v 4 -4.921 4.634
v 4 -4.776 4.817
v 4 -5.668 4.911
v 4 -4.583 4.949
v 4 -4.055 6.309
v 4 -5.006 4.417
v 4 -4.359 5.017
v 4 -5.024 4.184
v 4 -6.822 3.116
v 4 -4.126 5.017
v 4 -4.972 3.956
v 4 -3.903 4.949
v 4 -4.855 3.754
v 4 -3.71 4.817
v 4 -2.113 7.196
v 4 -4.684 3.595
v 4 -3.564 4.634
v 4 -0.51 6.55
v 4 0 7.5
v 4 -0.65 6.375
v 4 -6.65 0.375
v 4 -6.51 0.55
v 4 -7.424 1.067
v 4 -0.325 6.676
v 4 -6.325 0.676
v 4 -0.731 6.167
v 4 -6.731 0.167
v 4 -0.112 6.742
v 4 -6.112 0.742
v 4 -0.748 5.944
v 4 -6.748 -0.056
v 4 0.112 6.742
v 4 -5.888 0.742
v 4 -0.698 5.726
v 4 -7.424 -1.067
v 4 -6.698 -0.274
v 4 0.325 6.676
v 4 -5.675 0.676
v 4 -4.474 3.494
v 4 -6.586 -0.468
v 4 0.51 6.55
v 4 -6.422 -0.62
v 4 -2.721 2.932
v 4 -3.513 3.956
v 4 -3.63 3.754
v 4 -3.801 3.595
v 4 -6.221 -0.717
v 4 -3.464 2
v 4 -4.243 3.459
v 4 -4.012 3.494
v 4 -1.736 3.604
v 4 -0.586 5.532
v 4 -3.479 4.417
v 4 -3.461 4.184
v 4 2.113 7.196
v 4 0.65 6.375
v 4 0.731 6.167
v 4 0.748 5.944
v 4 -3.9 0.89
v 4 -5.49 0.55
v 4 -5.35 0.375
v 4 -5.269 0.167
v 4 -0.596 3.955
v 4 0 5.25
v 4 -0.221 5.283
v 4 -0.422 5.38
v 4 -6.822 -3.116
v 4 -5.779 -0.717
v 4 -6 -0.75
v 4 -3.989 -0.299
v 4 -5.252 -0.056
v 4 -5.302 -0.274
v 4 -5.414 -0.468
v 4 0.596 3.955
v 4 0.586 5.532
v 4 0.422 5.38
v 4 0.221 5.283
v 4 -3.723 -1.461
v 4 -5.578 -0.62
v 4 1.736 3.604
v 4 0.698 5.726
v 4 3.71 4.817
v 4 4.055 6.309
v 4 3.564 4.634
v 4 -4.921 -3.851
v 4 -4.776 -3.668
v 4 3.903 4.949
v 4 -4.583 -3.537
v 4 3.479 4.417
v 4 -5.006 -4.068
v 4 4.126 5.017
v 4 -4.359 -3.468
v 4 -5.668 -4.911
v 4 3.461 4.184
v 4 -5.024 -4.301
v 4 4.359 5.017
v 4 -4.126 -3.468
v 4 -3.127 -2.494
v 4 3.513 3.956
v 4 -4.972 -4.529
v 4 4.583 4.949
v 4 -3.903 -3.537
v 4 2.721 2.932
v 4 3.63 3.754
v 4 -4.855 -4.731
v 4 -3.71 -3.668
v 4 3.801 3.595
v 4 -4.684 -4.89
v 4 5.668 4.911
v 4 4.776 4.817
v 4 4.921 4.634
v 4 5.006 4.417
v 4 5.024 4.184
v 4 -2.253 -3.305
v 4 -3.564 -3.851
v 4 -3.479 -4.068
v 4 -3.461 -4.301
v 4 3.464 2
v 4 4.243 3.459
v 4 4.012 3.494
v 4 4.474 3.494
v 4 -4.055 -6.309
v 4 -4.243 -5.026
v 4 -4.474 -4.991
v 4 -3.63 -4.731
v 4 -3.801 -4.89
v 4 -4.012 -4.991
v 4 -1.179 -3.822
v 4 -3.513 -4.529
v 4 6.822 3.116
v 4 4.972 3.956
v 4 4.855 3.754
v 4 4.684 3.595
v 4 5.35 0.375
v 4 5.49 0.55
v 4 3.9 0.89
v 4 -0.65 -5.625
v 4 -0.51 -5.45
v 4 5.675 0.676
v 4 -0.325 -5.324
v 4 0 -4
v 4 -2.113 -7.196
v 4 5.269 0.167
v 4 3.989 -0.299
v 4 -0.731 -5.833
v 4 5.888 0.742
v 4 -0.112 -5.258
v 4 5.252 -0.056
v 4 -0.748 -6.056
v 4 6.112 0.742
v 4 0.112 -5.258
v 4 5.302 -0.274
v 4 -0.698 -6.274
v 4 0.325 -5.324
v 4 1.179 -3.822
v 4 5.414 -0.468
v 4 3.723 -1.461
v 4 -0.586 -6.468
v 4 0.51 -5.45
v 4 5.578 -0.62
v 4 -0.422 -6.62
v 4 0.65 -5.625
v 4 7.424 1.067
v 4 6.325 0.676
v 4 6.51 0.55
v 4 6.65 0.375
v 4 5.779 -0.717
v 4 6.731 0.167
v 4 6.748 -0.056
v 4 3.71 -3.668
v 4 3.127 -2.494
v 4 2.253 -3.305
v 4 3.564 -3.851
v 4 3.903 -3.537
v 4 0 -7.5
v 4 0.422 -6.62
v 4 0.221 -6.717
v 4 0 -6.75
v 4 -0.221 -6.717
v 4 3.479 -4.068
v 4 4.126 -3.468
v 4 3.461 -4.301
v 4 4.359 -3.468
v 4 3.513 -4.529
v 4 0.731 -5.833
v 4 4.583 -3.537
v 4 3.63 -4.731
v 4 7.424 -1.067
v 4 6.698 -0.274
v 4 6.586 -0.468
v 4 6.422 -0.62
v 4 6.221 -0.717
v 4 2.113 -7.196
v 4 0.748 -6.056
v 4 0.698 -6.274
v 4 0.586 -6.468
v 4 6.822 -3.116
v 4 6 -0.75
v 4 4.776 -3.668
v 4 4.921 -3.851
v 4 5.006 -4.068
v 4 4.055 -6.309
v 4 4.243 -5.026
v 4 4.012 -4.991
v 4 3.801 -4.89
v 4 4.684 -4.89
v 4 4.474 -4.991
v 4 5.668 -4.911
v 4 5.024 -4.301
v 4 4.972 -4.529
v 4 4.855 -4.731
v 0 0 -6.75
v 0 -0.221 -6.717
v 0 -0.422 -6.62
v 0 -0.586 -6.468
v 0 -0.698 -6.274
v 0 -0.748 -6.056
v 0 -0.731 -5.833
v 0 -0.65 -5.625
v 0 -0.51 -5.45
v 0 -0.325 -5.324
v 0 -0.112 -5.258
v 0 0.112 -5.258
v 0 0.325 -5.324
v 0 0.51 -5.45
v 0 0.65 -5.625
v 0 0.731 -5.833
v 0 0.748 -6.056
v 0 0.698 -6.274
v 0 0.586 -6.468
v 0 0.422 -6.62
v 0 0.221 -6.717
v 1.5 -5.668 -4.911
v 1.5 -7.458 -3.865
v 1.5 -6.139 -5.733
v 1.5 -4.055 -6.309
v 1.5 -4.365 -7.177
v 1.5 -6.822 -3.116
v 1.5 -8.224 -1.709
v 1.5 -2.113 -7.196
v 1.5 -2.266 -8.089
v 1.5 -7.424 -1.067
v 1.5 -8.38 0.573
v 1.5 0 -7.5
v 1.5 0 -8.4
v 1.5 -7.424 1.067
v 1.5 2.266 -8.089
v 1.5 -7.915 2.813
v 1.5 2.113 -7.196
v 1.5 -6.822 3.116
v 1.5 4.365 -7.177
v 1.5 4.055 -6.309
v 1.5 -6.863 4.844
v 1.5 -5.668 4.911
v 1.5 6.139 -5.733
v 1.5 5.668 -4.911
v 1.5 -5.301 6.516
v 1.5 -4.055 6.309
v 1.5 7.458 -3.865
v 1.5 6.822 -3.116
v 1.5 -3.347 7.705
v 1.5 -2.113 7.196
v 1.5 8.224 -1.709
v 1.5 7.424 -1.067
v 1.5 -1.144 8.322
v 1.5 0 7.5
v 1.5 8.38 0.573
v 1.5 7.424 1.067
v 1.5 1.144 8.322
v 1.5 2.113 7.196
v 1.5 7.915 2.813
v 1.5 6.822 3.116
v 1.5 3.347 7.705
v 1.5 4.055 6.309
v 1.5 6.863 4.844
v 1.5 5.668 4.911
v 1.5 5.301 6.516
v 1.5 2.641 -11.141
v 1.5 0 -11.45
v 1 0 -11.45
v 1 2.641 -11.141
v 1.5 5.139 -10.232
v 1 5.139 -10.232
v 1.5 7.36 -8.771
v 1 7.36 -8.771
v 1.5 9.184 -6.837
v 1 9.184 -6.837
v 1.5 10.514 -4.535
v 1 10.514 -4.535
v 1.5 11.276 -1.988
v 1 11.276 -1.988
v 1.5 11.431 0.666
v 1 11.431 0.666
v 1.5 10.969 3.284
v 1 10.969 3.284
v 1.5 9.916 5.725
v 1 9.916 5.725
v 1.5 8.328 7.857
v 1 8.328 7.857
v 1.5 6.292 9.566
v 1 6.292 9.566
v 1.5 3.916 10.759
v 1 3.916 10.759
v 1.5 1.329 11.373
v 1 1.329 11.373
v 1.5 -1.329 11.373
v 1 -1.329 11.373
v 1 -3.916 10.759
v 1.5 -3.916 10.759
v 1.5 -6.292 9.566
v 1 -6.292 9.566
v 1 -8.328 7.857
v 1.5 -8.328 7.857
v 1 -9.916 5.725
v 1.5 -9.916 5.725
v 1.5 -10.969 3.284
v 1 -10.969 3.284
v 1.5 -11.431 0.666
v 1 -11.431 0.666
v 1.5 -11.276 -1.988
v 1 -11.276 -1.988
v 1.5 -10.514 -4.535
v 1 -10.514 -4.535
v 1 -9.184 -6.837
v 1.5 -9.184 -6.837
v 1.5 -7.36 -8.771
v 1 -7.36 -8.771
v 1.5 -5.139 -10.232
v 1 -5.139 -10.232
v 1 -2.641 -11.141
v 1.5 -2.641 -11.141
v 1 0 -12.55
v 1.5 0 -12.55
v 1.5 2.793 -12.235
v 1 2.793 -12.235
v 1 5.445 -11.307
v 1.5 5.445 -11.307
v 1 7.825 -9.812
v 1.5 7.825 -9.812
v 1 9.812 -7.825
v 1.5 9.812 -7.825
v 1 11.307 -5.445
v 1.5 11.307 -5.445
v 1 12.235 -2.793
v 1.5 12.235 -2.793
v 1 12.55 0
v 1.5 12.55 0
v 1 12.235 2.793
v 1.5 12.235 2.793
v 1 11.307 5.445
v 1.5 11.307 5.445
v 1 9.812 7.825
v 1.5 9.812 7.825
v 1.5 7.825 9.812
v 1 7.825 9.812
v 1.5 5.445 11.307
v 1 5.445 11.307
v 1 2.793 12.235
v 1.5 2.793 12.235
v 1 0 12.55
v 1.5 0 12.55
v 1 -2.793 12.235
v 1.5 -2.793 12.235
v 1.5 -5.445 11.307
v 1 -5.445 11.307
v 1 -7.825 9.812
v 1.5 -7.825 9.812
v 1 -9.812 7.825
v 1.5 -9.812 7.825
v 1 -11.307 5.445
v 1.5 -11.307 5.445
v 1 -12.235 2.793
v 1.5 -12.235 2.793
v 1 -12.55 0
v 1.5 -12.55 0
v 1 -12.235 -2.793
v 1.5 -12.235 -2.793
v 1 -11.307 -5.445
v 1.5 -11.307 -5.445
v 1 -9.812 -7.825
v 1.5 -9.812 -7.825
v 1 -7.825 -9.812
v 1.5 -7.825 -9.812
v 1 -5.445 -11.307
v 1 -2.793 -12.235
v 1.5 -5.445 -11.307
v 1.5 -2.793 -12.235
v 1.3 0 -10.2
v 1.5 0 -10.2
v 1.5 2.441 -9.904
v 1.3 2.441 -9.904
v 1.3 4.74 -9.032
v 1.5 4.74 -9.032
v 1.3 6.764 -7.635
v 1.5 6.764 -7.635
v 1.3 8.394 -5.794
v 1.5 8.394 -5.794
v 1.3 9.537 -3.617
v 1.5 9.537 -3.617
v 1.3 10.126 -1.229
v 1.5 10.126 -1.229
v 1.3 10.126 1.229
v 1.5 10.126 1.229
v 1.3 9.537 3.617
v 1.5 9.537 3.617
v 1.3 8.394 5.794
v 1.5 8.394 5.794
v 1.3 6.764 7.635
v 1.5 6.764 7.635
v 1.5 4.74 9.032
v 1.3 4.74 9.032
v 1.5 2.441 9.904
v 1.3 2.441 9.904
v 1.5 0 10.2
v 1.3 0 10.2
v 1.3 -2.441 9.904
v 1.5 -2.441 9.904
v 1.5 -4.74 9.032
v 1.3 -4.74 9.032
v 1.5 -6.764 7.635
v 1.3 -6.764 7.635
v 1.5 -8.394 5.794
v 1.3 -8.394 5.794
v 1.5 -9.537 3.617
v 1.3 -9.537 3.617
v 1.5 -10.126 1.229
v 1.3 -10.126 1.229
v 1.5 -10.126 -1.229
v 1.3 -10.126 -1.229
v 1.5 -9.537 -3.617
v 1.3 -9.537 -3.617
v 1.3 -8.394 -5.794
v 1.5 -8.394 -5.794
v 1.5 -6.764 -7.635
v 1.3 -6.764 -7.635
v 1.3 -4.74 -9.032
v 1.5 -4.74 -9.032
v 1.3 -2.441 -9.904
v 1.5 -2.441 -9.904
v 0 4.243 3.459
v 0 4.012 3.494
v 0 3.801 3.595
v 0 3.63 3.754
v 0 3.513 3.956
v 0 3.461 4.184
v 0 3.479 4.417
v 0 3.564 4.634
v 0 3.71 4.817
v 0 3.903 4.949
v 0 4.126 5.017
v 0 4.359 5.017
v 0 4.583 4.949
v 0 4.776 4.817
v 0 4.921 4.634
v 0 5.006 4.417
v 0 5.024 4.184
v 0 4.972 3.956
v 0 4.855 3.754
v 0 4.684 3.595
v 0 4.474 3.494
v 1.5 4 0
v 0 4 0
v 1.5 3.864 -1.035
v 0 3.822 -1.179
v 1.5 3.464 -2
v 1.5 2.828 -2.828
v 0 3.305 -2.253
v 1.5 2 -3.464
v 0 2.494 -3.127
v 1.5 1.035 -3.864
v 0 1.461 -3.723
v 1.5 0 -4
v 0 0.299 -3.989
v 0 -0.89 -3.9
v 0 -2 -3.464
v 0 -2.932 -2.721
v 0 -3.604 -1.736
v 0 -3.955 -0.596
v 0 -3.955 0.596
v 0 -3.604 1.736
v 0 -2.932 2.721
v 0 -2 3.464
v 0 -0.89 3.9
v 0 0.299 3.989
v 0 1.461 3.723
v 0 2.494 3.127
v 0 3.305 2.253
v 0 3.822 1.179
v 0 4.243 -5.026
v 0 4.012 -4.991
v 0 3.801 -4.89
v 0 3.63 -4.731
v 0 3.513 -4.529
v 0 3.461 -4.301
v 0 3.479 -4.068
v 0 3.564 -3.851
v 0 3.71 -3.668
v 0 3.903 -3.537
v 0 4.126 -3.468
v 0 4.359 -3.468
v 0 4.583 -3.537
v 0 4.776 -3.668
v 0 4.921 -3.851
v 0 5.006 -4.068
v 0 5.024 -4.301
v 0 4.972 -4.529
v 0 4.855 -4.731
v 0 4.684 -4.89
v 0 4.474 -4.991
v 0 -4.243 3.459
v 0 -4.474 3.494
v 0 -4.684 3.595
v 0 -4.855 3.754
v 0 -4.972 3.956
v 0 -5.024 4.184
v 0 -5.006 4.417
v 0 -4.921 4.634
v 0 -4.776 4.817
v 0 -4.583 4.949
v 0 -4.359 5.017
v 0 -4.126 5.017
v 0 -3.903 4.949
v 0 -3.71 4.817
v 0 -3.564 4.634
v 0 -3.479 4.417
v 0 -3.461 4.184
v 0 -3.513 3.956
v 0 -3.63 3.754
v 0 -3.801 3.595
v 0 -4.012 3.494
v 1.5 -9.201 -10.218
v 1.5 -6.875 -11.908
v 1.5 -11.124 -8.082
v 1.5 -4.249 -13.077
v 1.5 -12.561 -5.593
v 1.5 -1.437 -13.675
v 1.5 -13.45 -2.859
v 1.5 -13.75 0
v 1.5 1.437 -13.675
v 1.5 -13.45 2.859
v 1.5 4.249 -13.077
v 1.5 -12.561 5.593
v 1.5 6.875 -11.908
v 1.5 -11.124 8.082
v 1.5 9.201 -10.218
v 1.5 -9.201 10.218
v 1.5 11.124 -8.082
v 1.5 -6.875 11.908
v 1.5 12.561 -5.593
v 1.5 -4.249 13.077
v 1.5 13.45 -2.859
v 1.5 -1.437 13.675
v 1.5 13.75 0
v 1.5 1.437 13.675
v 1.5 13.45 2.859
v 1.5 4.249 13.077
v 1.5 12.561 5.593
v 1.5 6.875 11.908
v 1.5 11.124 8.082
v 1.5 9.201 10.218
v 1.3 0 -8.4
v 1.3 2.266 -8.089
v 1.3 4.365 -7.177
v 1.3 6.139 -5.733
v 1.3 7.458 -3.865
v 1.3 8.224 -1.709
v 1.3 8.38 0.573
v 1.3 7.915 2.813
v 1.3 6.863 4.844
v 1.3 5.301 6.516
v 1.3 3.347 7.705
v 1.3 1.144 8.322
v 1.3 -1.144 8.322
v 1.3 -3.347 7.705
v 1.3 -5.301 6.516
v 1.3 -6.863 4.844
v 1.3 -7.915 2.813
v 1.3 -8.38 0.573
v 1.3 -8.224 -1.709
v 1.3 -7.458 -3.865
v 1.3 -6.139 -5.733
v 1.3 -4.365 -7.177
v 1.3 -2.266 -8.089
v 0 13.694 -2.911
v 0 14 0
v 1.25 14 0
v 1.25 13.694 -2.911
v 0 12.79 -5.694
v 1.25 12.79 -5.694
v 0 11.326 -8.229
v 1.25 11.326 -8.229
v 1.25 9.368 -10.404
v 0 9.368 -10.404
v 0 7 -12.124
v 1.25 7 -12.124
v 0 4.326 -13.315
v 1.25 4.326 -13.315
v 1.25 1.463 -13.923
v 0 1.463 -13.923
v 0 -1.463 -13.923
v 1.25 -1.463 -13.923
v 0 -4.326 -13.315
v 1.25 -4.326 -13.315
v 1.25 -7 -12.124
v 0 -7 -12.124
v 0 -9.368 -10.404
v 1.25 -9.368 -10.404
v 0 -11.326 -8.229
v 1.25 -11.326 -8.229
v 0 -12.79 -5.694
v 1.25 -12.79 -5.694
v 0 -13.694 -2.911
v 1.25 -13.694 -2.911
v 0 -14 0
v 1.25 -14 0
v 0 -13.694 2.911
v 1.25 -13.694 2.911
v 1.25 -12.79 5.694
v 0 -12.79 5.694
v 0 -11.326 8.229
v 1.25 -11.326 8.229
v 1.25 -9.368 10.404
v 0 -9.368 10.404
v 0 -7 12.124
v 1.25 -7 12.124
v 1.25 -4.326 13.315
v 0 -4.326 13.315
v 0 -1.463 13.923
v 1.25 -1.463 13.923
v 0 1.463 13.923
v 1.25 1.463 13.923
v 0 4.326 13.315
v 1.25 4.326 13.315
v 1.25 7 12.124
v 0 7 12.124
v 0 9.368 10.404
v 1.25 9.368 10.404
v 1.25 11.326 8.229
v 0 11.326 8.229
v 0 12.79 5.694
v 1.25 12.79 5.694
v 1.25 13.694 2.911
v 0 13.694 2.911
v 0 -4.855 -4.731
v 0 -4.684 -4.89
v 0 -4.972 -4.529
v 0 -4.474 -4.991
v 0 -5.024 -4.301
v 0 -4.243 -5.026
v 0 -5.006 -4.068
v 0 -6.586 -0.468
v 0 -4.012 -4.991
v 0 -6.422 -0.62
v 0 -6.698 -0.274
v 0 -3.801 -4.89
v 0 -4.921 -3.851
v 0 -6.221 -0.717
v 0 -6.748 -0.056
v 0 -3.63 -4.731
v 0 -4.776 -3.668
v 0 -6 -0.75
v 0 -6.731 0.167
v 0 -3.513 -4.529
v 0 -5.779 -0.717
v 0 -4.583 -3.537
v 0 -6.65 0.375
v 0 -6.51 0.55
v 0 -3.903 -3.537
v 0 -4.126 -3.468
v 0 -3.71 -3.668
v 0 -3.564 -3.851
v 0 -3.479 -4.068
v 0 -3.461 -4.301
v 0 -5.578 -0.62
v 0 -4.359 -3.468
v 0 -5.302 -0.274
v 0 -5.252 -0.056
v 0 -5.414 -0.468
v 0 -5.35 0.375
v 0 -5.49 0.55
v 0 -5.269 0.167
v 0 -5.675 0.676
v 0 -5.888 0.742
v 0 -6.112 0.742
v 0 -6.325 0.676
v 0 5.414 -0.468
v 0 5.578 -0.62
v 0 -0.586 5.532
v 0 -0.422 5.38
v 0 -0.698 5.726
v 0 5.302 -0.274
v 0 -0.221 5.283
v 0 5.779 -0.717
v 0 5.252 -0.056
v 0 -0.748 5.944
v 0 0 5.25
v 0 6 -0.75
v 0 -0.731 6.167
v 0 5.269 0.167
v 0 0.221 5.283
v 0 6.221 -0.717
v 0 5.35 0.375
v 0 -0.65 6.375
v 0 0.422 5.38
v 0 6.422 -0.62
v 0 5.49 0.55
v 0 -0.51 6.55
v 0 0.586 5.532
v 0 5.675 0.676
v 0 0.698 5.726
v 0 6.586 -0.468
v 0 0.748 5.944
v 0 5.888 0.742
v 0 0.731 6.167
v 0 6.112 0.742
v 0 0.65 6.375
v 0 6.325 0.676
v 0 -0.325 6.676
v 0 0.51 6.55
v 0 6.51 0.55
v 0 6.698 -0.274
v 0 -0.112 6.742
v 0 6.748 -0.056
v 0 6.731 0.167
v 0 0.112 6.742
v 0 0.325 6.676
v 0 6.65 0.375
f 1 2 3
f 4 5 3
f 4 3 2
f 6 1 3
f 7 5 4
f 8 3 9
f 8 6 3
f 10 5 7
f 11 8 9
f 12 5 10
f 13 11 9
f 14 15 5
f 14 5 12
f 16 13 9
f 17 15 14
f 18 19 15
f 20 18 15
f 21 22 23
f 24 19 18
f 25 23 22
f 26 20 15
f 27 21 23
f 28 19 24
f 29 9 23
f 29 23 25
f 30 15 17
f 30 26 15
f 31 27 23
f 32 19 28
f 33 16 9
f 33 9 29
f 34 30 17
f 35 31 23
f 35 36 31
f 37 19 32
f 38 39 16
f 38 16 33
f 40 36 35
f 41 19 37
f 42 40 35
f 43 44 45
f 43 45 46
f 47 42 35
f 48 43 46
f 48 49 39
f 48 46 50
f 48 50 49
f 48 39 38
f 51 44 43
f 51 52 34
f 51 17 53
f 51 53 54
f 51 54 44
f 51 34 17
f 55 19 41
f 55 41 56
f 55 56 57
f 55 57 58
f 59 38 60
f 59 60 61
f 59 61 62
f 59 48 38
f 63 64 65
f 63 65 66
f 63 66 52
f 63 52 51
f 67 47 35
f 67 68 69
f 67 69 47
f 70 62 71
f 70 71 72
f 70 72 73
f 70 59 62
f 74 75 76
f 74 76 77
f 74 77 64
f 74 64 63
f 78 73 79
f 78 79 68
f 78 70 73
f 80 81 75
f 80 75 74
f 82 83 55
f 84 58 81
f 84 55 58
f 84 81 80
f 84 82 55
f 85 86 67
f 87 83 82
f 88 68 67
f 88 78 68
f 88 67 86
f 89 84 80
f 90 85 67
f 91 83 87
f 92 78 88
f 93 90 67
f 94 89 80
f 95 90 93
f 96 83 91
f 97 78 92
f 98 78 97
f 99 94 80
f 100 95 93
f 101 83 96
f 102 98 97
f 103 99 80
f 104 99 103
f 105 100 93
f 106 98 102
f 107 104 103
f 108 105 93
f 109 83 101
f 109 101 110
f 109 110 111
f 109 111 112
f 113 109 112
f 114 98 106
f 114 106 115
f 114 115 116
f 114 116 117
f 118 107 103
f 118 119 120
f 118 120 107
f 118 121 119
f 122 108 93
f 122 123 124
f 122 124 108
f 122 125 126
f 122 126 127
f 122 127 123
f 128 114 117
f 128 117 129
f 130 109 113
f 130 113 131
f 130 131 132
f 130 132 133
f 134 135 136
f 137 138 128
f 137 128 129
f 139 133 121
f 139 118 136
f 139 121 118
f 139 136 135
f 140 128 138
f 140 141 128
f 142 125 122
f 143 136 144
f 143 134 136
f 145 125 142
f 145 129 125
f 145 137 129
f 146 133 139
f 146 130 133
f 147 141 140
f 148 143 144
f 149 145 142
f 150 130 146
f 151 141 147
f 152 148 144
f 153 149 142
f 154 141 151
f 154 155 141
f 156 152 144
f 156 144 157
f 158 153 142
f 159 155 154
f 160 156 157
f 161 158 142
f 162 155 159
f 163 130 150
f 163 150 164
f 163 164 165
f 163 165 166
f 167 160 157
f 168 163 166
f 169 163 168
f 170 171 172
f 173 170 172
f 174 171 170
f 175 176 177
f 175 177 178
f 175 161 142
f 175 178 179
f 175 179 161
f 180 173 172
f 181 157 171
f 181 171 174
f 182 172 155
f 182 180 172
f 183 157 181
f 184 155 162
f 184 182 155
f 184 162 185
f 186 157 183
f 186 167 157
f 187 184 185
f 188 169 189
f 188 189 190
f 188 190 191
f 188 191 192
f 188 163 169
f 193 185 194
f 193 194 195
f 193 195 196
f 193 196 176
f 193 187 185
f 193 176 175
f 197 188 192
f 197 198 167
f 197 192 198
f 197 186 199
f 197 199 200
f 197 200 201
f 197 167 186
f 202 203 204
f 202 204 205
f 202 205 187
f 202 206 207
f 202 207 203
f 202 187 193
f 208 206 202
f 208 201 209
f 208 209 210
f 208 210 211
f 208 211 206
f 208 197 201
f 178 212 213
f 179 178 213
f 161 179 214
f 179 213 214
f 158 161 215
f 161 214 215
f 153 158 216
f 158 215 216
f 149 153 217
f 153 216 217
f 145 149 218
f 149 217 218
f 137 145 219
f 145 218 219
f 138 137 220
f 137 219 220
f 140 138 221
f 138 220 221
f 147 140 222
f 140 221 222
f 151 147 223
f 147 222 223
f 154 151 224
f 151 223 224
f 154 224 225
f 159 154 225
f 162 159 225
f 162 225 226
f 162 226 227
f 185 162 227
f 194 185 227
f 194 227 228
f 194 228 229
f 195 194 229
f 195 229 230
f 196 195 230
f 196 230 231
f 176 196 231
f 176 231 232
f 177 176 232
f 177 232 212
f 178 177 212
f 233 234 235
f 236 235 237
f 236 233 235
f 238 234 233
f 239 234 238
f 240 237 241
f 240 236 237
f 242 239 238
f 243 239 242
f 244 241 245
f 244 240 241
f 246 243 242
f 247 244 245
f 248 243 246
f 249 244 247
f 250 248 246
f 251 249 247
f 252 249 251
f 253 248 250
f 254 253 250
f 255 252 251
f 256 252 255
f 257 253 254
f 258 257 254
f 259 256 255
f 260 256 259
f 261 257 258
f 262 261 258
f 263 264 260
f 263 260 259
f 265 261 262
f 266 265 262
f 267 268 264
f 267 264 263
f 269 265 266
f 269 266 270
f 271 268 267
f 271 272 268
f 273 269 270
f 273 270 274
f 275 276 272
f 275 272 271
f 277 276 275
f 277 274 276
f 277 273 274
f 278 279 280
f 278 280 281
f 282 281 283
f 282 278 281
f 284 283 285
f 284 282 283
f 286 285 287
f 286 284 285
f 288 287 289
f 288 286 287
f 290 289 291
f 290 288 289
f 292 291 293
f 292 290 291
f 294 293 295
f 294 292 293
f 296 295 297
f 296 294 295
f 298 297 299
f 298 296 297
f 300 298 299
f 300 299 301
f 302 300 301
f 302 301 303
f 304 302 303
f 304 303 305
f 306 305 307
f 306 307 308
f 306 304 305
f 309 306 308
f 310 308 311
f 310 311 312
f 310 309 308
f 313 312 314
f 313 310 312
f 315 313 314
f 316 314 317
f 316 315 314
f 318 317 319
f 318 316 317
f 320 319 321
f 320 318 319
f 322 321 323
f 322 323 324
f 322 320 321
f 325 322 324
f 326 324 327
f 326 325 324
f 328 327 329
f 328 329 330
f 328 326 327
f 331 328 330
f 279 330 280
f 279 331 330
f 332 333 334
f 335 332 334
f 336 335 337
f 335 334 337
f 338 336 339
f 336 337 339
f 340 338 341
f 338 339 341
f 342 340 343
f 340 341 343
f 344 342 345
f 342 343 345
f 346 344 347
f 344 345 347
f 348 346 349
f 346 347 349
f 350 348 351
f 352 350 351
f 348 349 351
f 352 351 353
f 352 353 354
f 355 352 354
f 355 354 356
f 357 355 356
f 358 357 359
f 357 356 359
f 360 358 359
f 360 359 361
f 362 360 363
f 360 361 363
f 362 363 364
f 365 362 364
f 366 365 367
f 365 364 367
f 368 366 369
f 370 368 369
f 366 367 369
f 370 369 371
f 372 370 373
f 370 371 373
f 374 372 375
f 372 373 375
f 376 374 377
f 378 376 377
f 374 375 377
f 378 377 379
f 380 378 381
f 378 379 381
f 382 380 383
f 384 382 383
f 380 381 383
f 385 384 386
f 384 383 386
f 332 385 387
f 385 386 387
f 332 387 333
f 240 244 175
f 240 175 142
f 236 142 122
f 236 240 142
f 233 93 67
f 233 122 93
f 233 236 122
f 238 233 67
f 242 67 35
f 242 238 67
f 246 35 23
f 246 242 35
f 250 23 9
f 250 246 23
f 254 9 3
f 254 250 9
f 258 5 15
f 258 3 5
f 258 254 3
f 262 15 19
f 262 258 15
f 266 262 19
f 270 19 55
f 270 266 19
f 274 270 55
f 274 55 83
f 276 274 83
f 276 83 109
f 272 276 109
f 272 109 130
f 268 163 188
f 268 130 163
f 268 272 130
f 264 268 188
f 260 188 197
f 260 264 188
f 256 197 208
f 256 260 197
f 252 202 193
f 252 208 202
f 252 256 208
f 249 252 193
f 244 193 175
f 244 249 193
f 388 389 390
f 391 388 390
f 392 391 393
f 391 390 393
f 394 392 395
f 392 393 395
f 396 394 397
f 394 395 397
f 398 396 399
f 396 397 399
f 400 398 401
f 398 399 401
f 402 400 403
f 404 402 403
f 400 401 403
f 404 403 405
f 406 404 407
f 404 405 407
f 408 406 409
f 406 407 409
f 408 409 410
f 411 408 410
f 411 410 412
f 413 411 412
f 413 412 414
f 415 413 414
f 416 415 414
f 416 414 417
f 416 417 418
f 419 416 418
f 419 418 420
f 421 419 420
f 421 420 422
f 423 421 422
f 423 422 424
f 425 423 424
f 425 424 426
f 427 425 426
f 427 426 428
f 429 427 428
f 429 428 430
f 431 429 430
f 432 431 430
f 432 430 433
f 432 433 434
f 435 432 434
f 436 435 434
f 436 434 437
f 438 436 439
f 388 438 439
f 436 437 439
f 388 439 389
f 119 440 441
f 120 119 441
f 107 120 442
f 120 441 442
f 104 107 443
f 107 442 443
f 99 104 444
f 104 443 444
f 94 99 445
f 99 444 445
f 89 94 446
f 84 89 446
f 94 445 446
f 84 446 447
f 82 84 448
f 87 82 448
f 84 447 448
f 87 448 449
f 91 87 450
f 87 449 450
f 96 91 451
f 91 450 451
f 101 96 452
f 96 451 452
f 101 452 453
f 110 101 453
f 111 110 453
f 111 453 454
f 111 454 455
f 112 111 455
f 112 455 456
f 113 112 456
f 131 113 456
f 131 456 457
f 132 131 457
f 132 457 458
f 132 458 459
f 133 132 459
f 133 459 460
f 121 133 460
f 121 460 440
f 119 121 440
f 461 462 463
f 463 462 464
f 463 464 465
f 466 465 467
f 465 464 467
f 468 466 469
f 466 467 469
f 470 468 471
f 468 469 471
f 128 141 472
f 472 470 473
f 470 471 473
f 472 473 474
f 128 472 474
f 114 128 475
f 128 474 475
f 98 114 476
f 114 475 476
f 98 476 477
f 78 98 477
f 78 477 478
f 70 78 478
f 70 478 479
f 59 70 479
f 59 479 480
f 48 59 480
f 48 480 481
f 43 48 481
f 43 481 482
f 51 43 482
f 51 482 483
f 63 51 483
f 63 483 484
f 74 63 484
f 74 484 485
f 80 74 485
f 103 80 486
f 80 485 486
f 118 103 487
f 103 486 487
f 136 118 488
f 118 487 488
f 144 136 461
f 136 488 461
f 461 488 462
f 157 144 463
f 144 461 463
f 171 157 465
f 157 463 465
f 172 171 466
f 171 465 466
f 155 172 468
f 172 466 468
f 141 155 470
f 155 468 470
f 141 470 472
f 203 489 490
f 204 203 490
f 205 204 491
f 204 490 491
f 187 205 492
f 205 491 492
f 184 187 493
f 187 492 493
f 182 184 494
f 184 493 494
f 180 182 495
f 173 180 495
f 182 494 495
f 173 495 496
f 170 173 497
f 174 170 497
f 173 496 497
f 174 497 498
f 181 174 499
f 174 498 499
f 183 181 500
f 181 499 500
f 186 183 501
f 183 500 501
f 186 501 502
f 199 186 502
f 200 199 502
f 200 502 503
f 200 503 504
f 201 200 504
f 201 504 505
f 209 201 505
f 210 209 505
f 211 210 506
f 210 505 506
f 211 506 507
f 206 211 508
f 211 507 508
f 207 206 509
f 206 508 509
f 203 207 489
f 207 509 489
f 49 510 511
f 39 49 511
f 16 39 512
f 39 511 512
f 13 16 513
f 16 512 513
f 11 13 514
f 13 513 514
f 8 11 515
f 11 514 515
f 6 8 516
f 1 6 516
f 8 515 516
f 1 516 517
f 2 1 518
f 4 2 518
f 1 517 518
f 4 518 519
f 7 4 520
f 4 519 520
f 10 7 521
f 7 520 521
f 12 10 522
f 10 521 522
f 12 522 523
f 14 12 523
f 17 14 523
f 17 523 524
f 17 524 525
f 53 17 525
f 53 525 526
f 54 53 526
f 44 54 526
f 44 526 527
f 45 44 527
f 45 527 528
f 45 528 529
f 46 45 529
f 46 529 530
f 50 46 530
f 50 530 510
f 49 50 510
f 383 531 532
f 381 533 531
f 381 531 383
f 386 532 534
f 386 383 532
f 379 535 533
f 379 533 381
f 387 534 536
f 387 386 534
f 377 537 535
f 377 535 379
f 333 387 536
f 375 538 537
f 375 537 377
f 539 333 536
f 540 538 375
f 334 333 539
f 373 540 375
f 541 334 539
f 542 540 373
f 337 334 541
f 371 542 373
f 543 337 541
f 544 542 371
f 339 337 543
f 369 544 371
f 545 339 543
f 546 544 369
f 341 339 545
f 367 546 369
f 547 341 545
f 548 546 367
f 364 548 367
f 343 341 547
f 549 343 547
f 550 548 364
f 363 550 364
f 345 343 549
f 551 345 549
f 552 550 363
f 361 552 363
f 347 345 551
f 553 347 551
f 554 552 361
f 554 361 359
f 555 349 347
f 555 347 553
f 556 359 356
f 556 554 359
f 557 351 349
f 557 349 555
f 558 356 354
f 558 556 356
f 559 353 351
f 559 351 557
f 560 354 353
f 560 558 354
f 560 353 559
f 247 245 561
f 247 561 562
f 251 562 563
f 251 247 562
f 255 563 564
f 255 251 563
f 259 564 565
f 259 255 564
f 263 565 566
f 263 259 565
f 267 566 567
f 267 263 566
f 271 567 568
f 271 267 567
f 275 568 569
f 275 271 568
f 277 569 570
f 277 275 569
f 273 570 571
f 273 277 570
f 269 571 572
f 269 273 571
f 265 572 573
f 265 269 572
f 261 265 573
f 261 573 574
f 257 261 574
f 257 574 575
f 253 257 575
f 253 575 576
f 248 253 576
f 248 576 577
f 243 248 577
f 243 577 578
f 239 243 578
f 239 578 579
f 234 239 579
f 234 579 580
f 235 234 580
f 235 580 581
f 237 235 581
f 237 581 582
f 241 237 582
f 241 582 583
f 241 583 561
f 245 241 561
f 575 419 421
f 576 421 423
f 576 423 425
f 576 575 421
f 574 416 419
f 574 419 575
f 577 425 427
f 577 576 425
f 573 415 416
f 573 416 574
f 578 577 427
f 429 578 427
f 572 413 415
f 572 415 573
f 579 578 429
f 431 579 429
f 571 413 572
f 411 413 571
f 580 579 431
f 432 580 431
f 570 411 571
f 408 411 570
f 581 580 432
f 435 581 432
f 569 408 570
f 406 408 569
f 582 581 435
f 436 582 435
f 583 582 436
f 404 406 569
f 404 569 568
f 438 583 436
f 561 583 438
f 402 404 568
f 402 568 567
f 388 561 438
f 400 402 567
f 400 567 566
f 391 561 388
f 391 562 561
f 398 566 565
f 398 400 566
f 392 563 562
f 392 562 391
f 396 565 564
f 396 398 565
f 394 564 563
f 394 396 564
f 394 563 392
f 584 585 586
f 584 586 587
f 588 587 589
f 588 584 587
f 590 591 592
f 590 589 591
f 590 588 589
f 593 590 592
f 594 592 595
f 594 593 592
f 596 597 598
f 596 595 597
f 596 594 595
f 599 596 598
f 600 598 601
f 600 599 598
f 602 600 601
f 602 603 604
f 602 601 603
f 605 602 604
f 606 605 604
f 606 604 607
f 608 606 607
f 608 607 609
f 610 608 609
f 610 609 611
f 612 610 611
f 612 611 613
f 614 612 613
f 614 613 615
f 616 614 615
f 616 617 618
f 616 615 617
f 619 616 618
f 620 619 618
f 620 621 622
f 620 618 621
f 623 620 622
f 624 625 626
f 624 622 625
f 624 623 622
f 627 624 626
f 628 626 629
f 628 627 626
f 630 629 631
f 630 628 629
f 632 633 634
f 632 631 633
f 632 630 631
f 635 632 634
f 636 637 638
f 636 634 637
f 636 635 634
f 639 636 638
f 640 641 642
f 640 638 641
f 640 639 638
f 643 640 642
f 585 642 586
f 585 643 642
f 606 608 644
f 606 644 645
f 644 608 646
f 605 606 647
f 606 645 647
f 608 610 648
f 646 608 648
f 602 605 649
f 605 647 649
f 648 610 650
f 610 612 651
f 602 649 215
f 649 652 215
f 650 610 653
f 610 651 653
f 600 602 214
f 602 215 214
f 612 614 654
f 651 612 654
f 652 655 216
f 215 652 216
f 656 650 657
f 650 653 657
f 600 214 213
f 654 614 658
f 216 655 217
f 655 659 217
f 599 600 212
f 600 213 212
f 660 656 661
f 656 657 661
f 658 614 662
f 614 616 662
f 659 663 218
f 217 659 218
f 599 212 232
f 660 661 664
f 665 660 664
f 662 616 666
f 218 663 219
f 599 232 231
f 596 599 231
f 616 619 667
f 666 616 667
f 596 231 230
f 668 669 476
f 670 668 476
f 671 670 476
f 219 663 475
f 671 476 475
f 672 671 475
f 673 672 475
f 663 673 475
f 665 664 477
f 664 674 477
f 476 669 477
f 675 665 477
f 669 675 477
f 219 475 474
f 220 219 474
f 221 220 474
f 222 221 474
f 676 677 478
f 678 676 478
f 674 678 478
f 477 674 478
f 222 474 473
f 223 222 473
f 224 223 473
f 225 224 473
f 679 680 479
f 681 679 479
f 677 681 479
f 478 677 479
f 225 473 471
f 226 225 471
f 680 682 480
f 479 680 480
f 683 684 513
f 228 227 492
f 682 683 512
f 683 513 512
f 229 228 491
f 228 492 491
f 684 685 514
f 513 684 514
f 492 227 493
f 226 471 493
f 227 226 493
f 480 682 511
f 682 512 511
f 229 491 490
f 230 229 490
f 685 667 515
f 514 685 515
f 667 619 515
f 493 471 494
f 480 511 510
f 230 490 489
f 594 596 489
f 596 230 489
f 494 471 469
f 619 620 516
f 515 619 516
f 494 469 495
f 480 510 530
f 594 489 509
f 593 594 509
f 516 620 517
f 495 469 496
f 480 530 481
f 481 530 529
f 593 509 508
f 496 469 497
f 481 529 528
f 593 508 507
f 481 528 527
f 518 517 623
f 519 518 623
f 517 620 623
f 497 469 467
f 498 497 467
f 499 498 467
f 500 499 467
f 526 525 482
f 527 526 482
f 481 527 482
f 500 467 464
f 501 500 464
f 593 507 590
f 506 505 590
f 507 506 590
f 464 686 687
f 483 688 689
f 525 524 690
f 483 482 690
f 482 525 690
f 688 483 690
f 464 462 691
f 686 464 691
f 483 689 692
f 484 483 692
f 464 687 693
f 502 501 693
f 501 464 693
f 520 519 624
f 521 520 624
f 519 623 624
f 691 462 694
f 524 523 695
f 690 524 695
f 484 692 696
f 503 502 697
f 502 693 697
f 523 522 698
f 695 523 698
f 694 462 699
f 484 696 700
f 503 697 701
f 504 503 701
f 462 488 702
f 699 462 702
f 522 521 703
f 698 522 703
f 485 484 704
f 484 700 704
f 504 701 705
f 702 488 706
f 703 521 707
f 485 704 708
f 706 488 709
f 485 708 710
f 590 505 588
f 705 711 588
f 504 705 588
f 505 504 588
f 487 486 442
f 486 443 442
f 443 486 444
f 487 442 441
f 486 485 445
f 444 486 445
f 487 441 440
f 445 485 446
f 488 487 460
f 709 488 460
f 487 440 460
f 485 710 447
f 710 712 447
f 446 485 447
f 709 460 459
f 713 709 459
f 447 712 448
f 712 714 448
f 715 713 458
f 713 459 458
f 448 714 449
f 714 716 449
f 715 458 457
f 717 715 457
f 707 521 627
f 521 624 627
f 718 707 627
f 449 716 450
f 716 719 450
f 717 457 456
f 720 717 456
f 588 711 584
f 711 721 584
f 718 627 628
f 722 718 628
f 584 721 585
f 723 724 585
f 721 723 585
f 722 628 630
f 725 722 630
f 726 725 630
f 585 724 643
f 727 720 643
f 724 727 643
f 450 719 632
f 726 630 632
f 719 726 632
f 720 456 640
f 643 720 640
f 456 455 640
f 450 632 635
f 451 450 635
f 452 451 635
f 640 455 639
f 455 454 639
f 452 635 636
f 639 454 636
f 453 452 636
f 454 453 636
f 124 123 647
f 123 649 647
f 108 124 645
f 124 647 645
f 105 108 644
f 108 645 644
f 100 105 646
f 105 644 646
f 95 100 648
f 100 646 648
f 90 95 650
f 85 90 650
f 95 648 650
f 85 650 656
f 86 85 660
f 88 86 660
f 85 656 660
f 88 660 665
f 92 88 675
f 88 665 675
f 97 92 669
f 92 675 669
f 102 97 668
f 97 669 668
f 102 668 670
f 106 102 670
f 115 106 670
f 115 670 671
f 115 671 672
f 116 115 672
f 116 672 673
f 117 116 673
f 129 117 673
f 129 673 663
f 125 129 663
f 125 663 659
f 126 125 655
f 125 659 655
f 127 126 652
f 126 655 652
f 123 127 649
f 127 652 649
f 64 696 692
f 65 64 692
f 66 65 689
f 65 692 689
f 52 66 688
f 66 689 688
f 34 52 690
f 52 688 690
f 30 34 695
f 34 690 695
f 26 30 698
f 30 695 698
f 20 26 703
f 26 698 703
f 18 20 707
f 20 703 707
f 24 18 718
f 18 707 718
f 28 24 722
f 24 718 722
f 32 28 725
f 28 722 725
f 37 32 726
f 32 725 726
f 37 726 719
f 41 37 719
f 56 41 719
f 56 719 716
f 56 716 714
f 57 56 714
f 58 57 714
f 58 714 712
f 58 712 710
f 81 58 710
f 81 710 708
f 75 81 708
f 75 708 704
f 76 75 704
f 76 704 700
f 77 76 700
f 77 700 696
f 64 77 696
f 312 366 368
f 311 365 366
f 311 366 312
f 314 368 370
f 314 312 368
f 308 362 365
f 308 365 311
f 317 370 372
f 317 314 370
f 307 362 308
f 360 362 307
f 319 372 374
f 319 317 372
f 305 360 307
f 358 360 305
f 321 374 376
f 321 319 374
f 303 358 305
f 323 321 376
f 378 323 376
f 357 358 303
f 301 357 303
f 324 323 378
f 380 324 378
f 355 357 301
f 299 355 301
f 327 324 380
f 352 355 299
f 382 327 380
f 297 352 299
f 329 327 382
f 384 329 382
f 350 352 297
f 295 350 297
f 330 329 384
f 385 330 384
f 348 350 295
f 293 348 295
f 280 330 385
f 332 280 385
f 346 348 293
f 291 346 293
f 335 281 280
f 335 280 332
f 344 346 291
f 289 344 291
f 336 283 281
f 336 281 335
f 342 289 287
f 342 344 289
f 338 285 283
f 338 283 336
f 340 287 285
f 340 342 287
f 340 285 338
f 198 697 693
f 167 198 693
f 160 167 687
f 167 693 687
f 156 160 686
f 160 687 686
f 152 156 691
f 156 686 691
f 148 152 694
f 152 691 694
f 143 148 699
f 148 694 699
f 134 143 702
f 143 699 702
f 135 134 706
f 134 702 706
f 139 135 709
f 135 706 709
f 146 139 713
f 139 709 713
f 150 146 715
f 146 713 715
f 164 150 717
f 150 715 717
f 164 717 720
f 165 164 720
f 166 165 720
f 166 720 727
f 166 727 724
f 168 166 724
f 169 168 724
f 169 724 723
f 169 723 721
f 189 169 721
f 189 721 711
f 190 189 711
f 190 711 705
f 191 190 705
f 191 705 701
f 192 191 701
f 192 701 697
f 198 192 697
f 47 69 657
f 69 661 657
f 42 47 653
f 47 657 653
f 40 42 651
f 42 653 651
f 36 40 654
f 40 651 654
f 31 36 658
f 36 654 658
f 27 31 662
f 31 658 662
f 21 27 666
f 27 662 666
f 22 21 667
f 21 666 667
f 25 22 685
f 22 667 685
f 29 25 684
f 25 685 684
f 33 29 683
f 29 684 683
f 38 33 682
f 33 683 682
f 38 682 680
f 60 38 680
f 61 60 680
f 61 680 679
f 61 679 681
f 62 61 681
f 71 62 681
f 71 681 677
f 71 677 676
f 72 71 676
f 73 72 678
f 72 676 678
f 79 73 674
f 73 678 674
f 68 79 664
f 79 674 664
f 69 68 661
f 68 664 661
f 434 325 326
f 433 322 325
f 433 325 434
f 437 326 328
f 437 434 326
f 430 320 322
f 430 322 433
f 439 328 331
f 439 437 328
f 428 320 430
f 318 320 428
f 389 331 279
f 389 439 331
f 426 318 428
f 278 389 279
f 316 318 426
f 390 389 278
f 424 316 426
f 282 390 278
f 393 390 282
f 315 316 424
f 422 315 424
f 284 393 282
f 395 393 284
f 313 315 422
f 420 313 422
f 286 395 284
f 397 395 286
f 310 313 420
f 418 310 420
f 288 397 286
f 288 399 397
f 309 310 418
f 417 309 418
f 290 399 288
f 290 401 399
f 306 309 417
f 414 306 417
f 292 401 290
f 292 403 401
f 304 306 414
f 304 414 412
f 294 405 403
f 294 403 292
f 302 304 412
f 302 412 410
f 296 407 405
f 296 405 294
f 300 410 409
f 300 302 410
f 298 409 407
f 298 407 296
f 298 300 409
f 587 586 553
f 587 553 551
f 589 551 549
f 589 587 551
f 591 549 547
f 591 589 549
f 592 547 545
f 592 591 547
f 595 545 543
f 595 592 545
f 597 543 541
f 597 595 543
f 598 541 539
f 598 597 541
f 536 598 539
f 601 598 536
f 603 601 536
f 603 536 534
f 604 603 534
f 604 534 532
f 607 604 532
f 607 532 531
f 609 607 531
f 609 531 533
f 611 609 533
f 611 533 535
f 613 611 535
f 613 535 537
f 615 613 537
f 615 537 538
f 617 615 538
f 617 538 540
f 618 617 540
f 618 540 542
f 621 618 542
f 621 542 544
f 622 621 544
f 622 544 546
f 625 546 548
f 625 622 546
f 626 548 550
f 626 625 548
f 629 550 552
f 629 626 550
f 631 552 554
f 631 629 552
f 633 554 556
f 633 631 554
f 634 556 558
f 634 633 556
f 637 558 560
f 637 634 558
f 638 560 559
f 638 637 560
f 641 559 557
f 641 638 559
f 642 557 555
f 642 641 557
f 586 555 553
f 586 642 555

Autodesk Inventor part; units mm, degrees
ref_plane "YZ Plane" through (0, 0, 0) normal (1, 0, 0) x (0, 1, 0)
ref_plane "XZ Plane" through (0, 0, 0) normal (0, 1, 0) x (-1, 0, 0)
ref_plane "XY Plane" through (0, 0, 0) normal (0, 0, 1) x (1, 0, 0)
sketch "スケッチ1" plane through (0, 0, 0) normal (1, 0, 0) x (0, 1, 0)
  circle A0 centre (0, 0) radius 14
  circle A1 centre (0, 0) radius 4
  dimension "d0" = 8
  dimension "d1" = 28
extrude "押し出し1" add sketch "スケッチ1" along normal blind 1.5
sketch "スケッチ2" plane through (1.5, 0, 0) normal (1, 0, 0) x (0, 0, -1)
  circle A0 centre (0, 0) radius 4 projected
  circle A1 centre (0, 0) radius 7.5
  dimension "d9" = 15
extrude "押し出し2" add sketch "スケッチ2" along normal blind 2.5
sketch "スケッチ3" plane through (4, 0, 0) normal (1, 0, 0) x (0, 0, -1)
  circle A0 centre (0, 0) radius 6 construction
  line L0 (0, 0) -> (6, 0) construction
  point P0 (0, 6)
  point P1 (-6, 0)
  point P2 (0, -6)
  dimension "d12" = 12
  dimension "d15" = 360
hole "穴1" at (4, 0, -6) at (4, 6, 0) at (4, 0, 6) at (4, -6, 0) direction (-1, 0, 0) diameter 1.5 end through all both
sketch "スケッチ4" plane through (4, 0, 0) normal (1, 0, 0) x (0, 0, -1)
  line L0 (0, 0) -> (4.2426, 4.2426) construction
  circle A0 centre (0, 0) radius 6 construction
  line L1 (0, 0) -> (12.9289, 0) construction
  point P0 (-4.2426, 4.2426)
  point P1 (-4.2426, -4.2426)
  point P2 (4.2426, -4.2426)
  dimension "d25" = 12
  dimension "d24" = 45
  dimension "d28" = 360
hole "穴2" at (4, 4.2426, -4.2426) at (4, 4.2426, 4.2426) at (4, -4.2426, 4.2426) at (4, -4.2426, -4.2426) direction (-1, 0, 0) diameter 1.567 end through all thread size "M2x0.4" class "6H" standard "ISO Metric profile"
sketch "スケッチ7" plane through (1.5, 0, 0) normal (1, 0, 0) x (0, 0, -1)
  circle A0 centre (0, 0) radius 8.4
  circle A1 centre (0, 0) radius 10.2
  dimension "d37" = 16.8
  dimension "d48" = 20.4
extrude "押し出し3" cut sketch "スケッチ7" against normal blind 0.2
sketch "スケッチ8" plane through (1.5, 0, 0) normal (1, 0, 0) x (0, 0, -1)
  circle A0 centre (0, 0) radius 12 construction
  circle A1 centre (0, 0) radius 12.55
  circle A2 centre (0, 0) radius 11.45
  dimension "d40" = 24
  dimension "d41" = 0.55
  dimension "d42" = 0.55
extrude "押し出し4" cut sketch "スケッチ8" against normal blind 0.5
chamfer "面取り1" distance 0.25 angle 45 1 edges at (1.5, -14, 0)
properties part number "COXA_PITCH_BEARING_BASE"
